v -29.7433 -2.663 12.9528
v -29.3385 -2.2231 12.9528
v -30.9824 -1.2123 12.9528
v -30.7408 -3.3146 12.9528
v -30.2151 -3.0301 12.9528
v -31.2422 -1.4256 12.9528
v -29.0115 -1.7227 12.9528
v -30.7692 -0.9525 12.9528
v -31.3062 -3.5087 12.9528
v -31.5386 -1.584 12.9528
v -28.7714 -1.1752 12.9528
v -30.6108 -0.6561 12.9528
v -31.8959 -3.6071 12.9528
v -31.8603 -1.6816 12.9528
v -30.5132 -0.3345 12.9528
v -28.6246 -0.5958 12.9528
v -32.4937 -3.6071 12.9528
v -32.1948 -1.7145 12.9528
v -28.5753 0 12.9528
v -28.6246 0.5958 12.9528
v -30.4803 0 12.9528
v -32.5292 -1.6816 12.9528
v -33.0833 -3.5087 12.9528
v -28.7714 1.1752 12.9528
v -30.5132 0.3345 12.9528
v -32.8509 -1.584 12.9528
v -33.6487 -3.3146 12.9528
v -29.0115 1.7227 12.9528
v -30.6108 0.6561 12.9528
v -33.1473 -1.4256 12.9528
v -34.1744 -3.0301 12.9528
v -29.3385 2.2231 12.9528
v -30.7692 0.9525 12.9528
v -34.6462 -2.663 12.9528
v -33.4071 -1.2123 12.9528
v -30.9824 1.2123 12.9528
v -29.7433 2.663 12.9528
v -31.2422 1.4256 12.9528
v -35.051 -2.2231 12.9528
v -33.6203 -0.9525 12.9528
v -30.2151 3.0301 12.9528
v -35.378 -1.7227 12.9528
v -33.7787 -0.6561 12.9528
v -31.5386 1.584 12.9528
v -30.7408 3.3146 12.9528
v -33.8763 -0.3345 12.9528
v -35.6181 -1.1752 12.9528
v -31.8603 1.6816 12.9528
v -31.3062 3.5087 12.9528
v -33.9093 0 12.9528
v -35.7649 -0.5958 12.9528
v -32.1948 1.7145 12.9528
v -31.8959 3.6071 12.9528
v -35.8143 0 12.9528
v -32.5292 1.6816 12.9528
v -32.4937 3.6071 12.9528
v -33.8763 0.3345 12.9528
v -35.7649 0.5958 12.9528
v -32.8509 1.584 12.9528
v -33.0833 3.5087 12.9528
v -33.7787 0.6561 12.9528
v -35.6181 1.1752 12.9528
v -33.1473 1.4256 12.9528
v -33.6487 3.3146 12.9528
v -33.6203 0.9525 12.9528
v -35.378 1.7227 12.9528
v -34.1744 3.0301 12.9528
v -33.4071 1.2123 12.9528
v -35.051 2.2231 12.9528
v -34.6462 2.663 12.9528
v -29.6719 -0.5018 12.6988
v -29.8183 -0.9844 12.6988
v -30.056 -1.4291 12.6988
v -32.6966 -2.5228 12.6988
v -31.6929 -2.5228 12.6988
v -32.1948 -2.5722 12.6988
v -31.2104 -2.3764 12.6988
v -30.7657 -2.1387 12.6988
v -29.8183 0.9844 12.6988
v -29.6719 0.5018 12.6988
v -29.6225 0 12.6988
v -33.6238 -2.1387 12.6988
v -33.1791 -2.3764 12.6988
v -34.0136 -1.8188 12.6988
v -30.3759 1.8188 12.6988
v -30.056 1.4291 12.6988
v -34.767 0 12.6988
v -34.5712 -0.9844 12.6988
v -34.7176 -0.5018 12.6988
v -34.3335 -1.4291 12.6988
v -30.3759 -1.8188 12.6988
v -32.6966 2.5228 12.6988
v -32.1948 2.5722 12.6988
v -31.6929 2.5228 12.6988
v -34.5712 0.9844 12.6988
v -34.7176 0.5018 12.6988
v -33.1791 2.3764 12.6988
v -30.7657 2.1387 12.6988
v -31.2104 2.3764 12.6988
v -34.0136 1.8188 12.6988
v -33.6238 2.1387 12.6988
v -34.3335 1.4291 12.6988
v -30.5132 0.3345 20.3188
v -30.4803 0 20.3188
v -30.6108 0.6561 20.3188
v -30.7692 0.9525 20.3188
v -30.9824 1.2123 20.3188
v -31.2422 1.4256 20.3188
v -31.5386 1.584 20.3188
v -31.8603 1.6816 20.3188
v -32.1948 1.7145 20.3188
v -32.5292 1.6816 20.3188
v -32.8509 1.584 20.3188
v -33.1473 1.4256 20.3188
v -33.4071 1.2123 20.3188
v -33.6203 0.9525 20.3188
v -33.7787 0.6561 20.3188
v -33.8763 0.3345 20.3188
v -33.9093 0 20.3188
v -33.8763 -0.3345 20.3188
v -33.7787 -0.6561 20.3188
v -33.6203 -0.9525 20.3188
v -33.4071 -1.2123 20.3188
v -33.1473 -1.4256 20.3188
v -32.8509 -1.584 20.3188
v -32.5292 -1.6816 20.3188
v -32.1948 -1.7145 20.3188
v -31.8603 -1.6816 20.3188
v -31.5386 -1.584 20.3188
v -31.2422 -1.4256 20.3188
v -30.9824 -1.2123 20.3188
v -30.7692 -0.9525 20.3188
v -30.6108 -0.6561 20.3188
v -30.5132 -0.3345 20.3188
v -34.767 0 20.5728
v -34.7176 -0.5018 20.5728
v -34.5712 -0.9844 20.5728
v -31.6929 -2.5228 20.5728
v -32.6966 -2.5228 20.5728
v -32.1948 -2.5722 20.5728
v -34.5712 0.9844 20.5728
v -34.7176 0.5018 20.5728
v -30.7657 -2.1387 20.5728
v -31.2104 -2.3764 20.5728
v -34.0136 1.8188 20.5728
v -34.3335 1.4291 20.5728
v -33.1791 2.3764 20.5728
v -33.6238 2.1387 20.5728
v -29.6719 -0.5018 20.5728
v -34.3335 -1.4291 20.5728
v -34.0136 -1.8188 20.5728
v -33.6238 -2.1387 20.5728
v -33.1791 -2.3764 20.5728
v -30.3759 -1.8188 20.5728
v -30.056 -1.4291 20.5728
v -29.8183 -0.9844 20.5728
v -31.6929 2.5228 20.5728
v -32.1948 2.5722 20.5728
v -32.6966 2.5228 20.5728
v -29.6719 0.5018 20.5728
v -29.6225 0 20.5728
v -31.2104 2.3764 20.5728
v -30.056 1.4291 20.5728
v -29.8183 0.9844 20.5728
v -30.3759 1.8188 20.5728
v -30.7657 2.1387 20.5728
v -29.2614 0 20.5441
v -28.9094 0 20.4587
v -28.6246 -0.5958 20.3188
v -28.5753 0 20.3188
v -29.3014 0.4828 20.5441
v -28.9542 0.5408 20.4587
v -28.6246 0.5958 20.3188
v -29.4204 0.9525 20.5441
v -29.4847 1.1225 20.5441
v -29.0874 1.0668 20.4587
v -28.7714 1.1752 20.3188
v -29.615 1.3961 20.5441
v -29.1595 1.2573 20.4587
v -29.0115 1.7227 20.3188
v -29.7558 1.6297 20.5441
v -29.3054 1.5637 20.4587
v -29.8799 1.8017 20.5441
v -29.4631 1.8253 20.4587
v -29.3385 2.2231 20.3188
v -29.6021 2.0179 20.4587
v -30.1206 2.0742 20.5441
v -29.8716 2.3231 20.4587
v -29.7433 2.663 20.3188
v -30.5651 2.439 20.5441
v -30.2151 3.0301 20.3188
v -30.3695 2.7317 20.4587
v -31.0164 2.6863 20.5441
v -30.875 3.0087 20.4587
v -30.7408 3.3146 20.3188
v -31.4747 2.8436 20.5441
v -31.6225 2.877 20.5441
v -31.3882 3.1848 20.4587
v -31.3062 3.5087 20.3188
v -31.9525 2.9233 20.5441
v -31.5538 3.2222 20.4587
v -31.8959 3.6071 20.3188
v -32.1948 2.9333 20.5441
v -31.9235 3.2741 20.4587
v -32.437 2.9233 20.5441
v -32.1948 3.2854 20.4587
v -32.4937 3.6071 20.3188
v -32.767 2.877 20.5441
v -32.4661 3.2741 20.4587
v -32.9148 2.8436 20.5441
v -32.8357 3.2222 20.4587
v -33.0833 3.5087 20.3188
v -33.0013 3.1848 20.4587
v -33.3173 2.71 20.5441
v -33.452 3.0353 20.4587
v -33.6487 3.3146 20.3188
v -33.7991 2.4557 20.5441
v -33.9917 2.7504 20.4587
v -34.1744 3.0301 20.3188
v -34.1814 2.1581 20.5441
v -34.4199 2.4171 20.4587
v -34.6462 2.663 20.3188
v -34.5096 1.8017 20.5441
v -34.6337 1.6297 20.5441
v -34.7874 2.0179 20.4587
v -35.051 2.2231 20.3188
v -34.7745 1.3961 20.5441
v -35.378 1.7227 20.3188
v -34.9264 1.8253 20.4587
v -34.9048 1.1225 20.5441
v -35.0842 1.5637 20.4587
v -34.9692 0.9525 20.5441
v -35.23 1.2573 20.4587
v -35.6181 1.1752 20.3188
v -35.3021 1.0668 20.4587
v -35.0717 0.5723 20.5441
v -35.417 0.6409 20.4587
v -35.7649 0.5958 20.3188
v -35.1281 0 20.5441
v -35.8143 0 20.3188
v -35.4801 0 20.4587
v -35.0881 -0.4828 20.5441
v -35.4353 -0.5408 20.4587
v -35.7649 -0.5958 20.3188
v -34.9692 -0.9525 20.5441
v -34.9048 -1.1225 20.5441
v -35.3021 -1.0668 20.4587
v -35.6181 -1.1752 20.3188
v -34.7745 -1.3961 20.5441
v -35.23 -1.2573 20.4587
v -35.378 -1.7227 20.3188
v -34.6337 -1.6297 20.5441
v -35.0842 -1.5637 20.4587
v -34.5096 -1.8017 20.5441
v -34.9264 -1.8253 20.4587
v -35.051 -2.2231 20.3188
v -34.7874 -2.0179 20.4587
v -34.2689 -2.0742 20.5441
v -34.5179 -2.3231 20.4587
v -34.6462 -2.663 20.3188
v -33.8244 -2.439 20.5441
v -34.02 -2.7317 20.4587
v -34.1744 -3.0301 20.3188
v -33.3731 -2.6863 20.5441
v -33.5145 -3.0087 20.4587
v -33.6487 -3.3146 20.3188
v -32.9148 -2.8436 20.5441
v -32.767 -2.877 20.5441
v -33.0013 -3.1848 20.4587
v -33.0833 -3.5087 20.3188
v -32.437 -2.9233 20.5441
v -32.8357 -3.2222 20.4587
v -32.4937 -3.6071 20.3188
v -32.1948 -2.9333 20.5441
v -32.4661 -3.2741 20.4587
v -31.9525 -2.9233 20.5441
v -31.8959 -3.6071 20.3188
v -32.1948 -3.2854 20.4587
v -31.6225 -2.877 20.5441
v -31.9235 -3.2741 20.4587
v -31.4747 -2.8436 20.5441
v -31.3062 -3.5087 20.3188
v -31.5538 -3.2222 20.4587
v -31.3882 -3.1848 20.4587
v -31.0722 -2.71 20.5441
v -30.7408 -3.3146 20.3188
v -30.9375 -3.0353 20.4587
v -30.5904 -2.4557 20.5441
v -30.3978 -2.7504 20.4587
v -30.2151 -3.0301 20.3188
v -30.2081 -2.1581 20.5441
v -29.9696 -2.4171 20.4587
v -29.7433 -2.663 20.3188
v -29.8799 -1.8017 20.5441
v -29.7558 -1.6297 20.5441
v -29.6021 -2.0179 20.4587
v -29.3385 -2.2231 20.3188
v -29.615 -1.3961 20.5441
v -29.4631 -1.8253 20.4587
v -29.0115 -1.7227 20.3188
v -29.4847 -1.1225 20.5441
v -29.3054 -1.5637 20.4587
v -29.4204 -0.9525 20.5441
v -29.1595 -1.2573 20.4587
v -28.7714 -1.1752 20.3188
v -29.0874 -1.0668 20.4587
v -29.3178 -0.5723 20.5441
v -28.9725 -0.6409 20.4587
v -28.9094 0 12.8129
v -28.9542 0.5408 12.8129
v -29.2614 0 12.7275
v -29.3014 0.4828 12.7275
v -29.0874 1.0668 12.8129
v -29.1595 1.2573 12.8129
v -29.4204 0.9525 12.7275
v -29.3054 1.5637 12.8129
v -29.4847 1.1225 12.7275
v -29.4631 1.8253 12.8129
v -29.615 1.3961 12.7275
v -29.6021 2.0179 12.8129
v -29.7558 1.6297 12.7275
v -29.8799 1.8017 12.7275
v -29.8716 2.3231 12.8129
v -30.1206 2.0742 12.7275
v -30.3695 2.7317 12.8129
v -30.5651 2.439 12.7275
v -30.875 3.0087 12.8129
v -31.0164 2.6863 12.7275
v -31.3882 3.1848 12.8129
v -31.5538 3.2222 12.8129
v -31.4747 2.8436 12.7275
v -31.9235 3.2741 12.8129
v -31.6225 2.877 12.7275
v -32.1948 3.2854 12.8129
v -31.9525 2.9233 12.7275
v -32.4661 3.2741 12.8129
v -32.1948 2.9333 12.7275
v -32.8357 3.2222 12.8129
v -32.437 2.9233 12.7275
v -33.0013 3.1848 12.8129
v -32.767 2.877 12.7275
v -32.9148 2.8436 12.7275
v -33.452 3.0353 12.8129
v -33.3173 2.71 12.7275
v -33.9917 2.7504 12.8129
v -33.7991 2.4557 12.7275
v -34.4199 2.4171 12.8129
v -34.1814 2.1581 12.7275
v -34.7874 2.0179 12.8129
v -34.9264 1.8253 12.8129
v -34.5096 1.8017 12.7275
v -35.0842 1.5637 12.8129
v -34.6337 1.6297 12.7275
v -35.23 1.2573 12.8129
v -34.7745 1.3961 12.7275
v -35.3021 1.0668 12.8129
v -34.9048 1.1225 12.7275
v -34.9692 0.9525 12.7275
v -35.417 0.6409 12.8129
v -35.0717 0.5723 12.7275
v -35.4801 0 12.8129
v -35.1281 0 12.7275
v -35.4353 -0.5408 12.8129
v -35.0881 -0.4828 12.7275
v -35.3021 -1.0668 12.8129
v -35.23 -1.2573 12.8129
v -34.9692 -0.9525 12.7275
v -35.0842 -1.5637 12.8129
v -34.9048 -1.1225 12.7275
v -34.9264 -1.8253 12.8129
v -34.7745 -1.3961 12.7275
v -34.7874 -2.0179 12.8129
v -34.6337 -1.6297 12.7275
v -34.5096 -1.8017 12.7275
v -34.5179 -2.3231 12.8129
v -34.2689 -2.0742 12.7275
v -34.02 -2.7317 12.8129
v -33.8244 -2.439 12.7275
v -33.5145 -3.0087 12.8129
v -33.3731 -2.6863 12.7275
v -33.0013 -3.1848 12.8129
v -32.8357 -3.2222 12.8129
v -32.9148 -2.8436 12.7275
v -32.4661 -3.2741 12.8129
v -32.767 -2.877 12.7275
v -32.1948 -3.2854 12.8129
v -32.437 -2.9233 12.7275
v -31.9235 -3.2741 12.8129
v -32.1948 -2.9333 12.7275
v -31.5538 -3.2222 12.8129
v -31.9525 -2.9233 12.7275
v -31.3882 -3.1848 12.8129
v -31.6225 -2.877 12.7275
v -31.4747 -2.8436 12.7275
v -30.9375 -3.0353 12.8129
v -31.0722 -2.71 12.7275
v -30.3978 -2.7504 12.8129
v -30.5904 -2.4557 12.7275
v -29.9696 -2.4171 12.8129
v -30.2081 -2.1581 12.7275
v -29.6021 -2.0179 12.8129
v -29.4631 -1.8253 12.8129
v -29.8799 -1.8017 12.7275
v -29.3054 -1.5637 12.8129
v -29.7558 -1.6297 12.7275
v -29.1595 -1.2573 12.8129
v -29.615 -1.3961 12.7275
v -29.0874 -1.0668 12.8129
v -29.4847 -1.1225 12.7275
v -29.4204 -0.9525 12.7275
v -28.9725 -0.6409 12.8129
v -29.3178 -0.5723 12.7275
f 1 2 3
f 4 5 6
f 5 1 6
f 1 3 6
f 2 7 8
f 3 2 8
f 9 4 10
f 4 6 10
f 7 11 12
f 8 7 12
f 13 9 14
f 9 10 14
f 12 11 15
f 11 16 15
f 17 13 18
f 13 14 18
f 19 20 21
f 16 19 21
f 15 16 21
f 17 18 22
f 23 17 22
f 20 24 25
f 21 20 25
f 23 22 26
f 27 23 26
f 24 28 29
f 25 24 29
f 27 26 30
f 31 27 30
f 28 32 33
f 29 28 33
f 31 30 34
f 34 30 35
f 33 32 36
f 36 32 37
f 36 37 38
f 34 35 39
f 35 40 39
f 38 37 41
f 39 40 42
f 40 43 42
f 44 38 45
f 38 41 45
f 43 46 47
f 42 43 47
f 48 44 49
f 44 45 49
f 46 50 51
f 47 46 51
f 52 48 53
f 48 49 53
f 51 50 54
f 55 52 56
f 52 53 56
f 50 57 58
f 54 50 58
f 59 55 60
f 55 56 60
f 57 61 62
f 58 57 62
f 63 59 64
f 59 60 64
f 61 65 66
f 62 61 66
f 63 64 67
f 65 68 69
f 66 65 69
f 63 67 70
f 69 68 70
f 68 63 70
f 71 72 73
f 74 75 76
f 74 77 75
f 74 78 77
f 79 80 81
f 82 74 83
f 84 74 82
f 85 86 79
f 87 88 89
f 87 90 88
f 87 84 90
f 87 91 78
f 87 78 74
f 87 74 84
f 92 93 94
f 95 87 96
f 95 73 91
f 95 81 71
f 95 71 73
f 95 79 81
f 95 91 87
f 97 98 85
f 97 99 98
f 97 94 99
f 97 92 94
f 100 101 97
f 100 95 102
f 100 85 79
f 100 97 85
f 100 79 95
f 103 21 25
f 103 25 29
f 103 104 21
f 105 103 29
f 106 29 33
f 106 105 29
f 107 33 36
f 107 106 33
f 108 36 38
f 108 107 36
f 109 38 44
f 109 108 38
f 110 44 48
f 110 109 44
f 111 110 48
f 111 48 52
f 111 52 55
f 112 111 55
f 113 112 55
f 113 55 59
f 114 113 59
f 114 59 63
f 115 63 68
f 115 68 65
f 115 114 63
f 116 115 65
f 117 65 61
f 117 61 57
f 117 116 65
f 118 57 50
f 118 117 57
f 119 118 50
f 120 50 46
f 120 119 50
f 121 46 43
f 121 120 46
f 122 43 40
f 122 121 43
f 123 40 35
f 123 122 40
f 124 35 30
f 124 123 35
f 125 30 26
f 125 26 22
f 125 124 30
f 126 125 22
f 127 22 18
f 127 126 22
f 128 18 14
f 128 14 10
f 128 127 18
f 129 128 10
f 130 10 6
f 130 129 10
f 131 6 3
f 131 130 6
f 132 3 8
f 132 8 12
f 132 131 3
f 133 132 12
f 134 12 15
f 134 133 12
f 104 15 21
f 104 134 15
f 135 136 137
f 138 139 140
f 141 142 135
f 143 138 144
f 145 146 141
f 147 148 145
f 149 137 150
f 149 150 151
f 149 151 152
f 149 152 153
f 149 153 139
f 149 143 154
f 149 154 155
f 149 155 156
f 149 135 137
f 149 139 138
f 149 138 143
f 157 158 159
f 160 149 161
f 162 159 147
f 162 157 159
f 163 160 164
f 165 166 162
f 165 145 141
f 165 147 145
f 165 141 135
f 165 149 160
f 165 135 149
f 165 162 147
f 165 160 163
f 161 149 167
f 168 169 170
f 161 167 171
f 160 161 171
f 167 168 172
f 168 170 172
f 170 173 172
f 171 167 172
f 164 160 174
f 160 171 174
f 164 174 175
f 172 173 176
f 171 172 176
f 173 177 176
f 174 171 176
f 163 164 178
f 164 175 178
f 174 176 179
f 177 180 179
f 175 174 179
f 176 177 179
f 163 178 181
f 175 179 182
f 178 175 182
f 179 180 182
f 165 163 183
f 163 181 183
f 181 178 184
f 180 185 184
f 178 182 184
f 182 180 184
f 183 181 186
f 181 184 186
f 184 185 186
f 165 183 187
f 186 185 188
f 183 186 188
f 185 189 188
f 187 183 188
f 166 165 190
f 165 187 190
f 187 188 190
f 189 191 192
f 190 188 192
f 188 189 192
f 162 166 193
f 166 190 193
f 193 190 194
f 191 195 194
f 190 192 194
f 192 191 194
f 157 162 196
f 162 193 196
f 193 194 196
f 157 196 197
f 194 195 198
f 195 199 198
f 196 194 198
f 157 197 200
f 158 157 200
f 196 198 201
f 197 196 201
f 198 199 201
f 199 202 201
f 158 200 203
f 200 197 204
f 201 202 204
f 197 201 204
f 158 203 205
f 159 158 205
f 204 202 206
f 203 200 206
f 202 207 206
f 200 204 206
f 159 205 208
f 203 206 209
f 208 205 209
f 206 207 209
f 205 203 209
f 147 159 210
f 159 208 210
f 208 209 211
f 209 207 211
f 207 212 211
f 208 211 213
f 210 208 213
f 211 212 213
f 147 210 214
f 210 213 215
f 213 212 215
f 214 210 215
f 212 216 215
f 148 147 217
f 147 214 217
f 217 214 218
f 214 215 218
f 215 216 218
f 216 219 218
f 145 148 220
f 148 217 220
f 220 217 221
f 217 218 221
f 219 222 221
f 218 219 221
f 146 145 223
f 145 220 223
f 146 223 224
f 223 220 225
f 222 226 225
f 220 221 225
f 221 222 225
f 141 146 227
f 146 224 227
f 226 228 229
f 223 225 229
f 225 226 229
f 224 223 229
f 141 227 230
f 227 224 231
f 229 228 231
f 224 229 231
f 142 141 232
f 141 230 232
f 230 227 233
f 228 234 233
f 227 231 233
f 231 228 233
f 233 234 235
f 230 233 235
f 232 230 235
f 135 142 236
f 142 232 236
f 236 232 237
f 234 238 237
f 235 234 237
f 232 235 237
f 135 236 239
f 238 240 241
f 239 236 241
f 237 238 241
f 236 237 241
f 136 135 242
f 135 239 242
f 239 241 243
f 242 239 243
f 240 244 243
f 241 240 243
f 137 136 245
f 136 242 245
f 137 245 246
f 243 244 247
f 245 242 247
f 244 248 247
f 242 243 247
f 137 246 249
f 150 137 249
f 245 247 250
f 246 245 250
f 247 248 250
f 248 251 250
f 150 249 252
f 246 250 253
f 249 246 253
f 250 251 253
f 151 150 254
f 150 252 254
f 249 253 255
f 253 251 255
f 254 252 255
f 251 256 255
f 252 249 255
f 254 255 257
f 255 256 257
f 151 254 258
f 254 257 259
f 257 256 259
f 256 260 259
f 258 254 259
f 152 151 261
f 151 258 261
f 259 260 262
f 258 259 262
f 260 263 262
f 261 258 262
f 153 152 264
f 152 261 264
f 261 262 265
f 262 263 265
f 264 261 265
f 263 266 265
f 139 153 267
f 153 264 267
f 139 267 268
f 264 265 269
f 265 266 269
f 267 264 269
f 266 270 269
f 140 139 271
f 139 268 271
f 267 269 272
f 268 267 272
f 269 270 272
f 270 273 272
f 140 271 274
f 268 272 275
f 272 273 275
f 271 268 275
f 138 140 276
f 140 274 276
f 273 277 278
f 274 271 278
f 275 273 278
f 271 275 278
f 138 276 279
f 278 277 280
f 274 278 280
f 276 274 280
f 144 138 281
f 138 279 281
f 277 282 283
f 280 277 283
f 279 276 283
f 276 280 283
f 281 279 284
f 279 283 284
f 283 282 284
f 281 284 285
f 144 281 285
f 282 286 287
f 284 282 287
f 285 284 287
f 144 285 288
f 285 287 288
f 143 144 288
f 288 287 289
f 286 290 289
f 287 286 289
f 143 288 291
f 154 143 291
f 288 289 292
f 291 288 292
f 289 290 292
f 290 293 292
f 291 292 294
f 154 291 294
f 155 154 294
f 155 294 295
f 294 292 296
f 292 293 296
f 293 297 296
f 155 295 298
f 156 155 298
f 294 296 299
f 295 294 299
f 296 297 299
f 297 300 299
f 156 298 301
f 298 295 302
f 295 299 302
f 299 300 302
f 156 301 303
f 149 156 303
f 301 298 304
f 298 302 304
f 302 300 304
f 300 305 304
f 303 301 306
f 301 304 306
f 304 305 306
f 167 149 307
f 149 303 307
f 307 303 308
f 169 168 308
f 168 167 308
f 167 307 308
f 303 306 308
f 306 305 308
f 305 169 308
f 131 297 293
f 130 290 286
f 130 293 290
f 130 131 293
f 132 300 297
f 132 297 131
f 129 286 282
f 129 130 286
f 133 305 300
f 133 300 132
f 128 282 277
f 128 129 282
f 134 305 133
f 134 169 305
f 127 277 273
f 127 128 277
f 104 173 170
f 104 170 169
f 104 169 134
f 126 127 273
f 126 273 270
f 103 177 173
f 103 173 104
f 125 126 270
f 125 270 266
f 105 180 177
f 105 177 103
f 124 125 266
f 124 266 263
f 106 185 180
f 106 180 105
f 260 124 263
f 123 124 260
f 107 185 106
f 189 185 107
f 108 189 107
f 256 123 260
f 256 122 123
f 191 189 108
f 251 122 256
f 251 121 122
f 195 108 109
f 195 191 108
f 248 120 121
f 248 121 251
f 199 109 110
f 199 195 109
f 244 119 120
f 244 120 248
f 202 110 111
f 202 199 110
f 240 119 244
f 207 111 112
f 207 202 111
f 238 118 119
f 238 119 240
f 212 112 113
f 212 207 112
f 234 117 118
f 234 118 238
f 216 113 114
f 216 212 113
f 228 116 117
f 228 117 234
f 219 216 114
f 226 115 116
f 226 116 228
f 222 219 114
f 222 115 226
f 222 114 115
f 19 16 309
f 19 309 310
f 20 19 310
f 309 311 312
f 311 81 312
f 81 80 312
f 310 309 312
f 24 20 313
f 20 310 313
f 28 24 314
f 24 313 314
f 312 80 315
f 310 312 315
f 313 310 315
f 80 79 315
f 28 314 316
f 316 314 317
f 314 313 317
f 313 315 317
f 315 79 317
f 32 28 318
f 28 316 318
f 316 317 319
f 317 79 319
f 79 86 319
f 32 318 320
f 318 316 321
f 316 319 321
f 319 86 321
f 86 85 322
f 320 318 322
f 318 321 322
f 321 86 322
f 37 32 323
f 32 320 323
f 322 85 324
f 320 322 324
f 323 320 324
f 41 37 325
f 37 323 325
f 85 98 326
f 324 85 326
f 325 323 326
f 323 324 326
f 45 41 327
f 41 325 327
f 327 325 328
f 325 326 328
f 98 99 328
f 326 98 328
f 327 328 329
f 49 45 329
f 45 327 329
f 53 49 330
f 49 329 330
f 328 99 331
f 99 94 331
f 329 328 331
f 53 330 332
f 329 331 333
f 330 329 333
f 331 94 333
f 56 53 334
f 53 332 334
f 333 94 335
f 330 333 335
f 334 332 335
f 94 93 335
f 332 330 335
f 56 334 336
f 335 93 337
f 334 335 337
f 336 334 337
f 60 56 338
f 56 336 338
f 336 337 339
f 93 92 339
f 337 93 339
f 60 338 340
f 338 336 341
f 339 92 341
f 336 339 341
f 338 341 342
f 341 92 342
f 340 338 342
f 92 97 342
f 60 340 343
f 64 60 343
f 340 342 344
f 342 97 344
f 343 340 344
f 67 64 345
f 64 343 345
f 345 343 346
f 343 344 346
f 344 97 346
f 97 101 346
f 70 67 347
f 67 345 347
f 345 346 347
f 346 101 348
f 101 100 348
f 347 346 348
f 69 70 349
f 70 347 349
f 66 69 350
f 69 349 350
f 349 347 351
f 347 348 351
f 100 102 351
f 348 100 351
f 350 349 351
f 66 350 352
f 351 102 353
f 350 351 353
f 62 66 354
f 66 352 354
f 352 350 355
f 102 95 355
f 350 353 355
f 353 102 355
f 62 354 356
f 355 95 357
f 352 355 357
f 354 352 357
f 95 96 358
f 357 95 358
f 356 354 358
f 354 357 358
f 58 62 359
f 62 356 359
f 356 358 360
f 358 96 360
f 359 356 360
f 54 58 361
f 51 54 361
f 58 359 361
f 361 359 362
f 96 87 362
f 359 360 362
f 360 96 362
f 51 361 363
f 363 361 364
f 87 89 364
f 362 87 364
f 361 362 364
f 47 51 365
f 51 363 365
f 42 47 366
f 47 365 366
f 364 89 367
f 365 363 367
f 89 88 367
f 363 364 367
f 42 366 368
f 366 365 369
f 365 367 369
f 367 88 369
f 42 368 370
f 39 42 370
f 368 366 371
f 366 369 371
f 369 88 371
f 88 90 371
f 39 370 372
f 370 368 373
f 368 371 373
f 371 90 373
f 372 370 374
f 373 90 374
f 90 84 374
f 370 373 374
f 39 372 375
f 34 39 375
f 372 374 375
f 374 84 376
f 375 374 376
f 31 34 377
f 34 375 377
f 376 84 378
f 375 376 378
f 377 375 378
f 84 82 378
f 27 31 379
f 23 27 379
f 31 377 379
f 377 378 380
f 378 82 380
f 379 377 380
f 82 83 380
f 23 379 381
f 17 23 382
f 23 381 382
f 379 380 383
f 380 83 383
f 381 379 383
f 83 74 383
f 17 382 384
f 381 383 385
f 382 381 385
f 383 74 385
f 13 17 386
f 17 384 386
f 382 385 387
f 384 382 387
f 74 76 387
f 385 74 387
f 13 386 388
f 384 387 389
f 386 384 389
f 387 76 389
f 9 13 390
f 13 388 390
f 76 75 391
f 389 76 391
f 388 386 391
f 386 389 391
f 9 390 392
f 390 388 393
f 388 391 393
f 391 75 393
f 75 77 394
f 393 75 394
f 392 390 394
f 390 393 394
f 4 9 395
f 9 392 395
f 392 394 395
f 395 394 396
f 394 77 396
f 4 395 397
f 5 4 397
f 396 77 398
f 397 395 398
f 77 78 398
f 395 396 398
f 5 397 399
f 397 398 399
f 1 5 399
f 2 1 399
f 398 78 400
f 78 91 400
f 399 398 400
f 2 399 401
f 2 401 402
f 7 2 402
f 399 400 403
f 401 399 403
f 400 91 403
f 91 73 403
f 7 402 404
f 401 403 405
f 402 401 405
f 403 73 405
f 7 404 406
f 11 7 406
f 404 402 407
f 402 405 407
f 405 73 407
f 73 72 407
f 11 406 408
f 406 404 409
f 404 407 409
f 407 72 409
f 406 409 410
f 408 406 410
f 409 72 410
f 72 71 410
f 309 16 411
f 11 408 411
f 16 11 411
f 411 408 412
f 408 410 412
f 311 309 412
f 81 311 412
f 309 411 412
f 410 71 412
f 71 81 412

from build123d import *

# Parameters (mm, degrees)
F0_W = 1.905
F0_H = 0.254


# Not quite as in the source:
# - a fillet or chamfer that OpenCascade refuses, or shapes differently, is made with other operations: its cross-section is extruded or revolved along the edge and cut away or added


with BuildPart() as f1:
    # F0 (on Front) → F1 (revolve)
    with BuildSketch(Plane.XZ):
        with Locations((-29.5277546042, 20.4458203979)):
            Rectangle(F0_W, F0_H)
        Polygon((-30.4802546042, 20.3188203979), (-30.4802546042, 20.5728203979), (-32.1947546042, 20.5728203979), (-32.1947546042, 12.6988203979), (-30.4802546042, 12.6988203979), (-30.4802546042, 12.9528203979), align=None)
        with Locations((-29.5277546042, 12.8258203979)):
            Rectangle(F0_W, F0_H)
    revolve(axis=Axis((-32.1947546042, 0, 16.6358203979), (0, 0, 1)))

    # F2: fillet of radius 2.286 on 1 edges, made by hand

    # F2_s1 → F2_t2 (revolve, cut)
    with BuildSketch(Plane.XZ):
        with BuildLine():
            ThreePointArc((-29.6225234331, 20.5728203979), (-29.0837080659, 20.5084130698), (-28.5752546042, 20.3188203979))
            Line((-28.5752546042, 20.3188203979), (-28.5752546042, 20.5728203979))
            Line((-28.5752546042, 20.5728203979), (-29.6225234331, 20.5728203979))
        make_face()
    revolve(axis=Axis((-32.1947546042, 0, 20.5728203979), (0, 0, 1)), mode=Mode.SUBTRACT)

    # F3: fillet of radius 2.286 on 1 edges, made by hand

    # F3_s1 → F3_t2 (revolve, cut)
    with BuildSketch(Plane.XZ):
        with BuildLine():
            ThreePointArc((-28.5752546042, 12.9528203979), (-29.0837080659, 12.763227726), (-29.6225234331, 12.6988203979))
            Line((-29.6225234331, 12.6988203979), (-28.5752546042, 12.6988203979))
            Line((-28.5752546042, 12.6988203979), (-28.5752546042, 12.9528203979))
        make_face()
    revolve(axis=Axis((-32.1947546042, 0, 12.6988203979), (0, 0, 1)), mode=Mode.SUBTRACT)


solid = f1.part
